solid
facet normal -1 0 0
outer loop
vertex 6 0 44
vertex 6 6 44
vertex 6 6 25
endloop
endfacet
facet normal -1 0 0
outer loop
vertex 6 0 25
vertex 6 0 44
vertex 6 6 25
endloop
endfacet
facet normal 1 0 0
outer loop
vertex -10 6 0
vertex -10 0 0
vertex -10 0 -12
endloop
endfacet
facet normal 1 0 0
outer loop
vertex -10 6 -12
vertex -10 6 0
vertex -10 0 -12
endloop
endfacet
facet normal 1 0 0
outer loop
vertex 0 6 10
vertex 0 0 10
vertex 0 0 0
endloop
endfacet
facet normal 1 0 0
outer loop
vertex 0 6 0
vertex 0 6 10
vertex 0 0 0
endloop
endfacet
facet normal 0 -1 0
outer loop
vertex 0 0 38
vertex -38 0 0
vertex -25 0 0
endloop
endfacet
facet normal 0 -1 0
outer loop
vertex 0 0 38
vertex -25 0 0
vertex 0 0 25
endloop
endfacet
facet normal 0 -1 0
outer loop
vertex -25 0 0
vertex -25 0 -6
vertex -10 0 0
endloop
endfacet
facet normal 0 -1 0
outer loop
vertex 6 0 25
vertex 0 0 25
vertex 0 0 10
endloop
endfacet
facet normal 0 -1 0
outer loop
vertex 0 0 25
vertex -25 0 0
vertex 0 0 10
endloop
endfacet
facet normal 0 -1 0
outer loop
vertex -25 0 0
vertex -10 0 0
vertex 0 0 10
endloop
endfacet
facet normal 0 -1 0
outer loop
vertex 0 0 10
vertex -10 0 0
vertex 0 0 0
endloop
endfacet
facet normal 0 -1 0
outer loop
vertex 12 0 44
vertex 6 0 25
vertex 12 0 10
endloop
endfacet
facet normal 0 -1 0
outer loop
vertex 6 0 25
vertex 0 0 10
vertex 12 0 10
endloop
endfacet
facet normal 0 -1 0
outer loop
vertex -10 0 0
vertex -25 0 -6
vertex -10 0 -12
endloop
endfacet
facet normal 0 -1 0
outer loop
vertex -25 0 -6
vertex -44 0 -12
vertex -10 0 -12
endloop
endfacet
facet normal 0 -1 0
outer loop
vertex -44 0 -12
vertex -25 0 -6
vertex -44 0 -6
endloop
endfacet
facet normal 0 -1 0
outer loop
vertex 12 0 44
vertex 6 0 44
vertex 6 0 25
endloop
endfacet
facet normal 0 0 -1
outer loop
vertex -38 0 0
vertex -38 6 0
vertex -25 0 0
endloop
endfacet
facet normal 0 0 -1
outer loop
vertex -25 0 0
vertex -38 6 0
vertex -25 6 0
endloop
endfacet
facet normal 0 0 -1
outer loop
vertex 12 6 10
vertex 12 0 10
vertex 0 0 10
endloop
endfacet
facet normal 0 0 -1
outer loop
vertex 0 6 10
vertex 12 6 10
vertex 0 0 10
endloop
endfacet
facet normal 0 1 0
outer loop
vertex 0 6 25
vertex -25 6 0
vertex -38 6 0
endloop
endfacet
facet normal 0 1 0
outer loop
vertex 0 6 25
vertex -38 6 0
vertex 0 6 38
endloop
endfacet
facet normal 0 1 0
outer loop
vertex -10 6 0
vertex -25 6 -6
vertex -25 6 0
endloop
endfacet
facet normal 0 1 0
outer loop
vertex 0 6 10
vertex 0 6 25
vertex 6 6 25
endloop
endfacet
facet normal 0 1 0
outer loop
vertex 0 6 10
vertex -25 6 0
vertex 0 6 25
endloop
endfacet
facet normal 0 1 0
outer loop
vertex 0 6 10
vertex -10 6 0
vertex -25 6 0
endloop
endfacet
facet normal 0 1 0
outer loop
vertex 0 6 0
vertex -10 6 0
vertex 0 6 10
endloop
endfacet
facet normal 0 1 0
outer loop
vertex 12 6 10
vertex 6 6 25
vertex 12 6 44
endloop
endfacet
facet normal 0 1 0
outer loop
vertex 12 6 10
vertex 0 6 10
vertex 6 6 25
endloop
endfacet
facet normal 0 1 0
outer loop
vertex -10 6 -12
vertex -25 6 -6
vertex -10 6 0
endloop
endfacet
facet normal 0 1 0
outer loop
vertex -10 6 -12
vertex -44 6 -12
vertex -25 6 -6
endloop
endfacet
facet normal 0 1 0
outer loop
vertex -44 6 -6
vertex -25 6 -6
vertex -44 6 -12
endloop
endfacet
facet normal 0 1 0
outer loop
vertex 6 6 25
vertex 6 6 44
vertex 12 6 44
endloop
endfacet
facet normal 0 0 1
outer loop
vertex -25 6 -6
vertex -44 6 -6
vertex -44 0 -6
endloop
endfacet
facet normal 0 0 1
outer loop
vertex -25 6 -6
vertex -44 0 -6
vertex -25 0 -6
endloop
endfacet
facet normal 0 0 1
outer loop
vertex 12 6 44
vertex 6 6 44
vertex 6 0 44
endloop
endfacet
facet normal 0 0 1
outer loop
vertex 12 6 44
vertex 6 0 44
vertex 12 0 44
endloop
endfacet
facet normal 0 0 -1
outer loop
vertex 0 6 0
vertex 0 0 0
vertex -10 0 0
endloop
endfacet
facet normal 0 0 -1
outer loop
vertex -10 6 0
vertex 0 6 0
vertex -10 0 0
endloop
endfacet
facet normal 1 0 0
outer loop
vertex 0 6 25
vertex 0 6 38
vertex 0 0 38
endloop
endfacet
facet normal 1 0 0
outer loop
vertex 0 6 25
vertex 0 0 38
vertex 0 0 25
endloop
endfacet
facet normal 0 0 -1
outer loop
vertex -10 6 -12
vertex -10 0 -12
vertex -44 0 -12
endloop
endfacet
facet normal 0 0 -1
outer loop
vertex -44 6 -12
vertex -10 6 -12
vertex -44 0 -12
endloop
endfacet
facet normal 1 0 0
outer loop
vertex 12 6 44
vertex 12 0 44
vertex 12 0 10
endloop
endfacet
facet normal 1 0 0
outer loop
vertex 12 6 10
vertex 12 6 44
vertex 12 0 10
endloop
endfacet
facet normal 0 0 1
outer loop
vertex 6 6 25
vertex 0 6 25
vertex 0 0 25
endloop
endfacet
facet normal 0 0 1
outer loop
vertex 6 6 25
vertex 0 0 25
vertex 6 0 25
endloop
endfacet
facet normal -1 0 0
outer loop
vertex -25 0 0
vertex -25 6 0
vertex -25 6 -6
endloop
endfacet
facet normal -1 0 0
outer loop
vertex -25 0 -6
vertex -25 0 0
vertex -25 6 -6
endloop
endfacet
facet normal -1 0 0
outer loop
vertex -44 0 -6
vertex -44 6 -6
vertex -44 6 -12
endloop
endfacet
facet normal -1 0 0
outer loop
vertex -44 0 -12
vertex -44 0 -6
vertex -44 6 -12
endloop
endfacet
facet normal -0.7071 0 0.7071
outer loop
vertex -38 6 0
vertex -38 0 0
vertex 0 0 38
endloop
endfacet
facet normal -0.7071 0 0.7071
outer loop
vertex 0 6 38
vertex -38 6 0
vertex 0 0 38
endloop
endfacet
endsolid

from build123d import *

# Parameters (mm, degrees)
BOSS_EXTRUDE1_DEPTH = 6
SKETCH3_W           = 19
SKETCH3_H           = 6
SKETCH3_W_2         = 6
SKETCH3_H_2         = 19
CUT_EXTRUDE1_DEPTH  = 71.964779997
SKETCH4_W           = 6
SKETCH4_H           = 6
CUT_EXTRUDE2_DEPTH  = 71.964779997


with BuildPart() as part:
    # Sketch2 → Boss-Extrude1 (new body)
    with BuildSketch(Plane(origin=(0, 0, 0), x_dir=(1, 0, 0), z_dir=(0, 1, 0))):
        Polygon((0, 0), (-10, 0), (-10, 12), (-50, 12), (12, -50), (12, -10), (0, -10), align=None)
    extrude(amount=BOSS_EXTRUDE1_DEPTH)

    # Sketch3 → Cut-Extrude1 (cut, through all)
    with BuildSketch(Plane(origin=(0, 6, 0), x_dir=(1, 0, 0), z_dir=(0, 1, 0))):
        with Locations((-34.5, 3)):
            Rectangle(SKETCH3_W, SKETCH3_H)
        with Locations((3, -34.5)):
            Rectangle(SKETCH3_W_2, SKETCH3_H_2)
    extrude(amount=-CUT_EXTRUDE1_DEPTH, mode=Mode.SUBTRACT)

    # Sketch4 → Cut-Extrude2 (cut, through all)
    with BuildSketch(Plane(origin=(0, 6, 0), x_dir=(1, 0, 0), z_dir=(0, 1, 0))):
        with Locations((-47, 9)):
            Rectangle(SKETCH4_W, SKETCH4_H)
        with Locations((9, -47)):
            Rectangle(SKETCH4_W, SKETCH4_H)
    extrude(amount=-CUT_EXTRUDE2_DEPTH, mode=Mode.SUBTRACT)


solid = part.part
